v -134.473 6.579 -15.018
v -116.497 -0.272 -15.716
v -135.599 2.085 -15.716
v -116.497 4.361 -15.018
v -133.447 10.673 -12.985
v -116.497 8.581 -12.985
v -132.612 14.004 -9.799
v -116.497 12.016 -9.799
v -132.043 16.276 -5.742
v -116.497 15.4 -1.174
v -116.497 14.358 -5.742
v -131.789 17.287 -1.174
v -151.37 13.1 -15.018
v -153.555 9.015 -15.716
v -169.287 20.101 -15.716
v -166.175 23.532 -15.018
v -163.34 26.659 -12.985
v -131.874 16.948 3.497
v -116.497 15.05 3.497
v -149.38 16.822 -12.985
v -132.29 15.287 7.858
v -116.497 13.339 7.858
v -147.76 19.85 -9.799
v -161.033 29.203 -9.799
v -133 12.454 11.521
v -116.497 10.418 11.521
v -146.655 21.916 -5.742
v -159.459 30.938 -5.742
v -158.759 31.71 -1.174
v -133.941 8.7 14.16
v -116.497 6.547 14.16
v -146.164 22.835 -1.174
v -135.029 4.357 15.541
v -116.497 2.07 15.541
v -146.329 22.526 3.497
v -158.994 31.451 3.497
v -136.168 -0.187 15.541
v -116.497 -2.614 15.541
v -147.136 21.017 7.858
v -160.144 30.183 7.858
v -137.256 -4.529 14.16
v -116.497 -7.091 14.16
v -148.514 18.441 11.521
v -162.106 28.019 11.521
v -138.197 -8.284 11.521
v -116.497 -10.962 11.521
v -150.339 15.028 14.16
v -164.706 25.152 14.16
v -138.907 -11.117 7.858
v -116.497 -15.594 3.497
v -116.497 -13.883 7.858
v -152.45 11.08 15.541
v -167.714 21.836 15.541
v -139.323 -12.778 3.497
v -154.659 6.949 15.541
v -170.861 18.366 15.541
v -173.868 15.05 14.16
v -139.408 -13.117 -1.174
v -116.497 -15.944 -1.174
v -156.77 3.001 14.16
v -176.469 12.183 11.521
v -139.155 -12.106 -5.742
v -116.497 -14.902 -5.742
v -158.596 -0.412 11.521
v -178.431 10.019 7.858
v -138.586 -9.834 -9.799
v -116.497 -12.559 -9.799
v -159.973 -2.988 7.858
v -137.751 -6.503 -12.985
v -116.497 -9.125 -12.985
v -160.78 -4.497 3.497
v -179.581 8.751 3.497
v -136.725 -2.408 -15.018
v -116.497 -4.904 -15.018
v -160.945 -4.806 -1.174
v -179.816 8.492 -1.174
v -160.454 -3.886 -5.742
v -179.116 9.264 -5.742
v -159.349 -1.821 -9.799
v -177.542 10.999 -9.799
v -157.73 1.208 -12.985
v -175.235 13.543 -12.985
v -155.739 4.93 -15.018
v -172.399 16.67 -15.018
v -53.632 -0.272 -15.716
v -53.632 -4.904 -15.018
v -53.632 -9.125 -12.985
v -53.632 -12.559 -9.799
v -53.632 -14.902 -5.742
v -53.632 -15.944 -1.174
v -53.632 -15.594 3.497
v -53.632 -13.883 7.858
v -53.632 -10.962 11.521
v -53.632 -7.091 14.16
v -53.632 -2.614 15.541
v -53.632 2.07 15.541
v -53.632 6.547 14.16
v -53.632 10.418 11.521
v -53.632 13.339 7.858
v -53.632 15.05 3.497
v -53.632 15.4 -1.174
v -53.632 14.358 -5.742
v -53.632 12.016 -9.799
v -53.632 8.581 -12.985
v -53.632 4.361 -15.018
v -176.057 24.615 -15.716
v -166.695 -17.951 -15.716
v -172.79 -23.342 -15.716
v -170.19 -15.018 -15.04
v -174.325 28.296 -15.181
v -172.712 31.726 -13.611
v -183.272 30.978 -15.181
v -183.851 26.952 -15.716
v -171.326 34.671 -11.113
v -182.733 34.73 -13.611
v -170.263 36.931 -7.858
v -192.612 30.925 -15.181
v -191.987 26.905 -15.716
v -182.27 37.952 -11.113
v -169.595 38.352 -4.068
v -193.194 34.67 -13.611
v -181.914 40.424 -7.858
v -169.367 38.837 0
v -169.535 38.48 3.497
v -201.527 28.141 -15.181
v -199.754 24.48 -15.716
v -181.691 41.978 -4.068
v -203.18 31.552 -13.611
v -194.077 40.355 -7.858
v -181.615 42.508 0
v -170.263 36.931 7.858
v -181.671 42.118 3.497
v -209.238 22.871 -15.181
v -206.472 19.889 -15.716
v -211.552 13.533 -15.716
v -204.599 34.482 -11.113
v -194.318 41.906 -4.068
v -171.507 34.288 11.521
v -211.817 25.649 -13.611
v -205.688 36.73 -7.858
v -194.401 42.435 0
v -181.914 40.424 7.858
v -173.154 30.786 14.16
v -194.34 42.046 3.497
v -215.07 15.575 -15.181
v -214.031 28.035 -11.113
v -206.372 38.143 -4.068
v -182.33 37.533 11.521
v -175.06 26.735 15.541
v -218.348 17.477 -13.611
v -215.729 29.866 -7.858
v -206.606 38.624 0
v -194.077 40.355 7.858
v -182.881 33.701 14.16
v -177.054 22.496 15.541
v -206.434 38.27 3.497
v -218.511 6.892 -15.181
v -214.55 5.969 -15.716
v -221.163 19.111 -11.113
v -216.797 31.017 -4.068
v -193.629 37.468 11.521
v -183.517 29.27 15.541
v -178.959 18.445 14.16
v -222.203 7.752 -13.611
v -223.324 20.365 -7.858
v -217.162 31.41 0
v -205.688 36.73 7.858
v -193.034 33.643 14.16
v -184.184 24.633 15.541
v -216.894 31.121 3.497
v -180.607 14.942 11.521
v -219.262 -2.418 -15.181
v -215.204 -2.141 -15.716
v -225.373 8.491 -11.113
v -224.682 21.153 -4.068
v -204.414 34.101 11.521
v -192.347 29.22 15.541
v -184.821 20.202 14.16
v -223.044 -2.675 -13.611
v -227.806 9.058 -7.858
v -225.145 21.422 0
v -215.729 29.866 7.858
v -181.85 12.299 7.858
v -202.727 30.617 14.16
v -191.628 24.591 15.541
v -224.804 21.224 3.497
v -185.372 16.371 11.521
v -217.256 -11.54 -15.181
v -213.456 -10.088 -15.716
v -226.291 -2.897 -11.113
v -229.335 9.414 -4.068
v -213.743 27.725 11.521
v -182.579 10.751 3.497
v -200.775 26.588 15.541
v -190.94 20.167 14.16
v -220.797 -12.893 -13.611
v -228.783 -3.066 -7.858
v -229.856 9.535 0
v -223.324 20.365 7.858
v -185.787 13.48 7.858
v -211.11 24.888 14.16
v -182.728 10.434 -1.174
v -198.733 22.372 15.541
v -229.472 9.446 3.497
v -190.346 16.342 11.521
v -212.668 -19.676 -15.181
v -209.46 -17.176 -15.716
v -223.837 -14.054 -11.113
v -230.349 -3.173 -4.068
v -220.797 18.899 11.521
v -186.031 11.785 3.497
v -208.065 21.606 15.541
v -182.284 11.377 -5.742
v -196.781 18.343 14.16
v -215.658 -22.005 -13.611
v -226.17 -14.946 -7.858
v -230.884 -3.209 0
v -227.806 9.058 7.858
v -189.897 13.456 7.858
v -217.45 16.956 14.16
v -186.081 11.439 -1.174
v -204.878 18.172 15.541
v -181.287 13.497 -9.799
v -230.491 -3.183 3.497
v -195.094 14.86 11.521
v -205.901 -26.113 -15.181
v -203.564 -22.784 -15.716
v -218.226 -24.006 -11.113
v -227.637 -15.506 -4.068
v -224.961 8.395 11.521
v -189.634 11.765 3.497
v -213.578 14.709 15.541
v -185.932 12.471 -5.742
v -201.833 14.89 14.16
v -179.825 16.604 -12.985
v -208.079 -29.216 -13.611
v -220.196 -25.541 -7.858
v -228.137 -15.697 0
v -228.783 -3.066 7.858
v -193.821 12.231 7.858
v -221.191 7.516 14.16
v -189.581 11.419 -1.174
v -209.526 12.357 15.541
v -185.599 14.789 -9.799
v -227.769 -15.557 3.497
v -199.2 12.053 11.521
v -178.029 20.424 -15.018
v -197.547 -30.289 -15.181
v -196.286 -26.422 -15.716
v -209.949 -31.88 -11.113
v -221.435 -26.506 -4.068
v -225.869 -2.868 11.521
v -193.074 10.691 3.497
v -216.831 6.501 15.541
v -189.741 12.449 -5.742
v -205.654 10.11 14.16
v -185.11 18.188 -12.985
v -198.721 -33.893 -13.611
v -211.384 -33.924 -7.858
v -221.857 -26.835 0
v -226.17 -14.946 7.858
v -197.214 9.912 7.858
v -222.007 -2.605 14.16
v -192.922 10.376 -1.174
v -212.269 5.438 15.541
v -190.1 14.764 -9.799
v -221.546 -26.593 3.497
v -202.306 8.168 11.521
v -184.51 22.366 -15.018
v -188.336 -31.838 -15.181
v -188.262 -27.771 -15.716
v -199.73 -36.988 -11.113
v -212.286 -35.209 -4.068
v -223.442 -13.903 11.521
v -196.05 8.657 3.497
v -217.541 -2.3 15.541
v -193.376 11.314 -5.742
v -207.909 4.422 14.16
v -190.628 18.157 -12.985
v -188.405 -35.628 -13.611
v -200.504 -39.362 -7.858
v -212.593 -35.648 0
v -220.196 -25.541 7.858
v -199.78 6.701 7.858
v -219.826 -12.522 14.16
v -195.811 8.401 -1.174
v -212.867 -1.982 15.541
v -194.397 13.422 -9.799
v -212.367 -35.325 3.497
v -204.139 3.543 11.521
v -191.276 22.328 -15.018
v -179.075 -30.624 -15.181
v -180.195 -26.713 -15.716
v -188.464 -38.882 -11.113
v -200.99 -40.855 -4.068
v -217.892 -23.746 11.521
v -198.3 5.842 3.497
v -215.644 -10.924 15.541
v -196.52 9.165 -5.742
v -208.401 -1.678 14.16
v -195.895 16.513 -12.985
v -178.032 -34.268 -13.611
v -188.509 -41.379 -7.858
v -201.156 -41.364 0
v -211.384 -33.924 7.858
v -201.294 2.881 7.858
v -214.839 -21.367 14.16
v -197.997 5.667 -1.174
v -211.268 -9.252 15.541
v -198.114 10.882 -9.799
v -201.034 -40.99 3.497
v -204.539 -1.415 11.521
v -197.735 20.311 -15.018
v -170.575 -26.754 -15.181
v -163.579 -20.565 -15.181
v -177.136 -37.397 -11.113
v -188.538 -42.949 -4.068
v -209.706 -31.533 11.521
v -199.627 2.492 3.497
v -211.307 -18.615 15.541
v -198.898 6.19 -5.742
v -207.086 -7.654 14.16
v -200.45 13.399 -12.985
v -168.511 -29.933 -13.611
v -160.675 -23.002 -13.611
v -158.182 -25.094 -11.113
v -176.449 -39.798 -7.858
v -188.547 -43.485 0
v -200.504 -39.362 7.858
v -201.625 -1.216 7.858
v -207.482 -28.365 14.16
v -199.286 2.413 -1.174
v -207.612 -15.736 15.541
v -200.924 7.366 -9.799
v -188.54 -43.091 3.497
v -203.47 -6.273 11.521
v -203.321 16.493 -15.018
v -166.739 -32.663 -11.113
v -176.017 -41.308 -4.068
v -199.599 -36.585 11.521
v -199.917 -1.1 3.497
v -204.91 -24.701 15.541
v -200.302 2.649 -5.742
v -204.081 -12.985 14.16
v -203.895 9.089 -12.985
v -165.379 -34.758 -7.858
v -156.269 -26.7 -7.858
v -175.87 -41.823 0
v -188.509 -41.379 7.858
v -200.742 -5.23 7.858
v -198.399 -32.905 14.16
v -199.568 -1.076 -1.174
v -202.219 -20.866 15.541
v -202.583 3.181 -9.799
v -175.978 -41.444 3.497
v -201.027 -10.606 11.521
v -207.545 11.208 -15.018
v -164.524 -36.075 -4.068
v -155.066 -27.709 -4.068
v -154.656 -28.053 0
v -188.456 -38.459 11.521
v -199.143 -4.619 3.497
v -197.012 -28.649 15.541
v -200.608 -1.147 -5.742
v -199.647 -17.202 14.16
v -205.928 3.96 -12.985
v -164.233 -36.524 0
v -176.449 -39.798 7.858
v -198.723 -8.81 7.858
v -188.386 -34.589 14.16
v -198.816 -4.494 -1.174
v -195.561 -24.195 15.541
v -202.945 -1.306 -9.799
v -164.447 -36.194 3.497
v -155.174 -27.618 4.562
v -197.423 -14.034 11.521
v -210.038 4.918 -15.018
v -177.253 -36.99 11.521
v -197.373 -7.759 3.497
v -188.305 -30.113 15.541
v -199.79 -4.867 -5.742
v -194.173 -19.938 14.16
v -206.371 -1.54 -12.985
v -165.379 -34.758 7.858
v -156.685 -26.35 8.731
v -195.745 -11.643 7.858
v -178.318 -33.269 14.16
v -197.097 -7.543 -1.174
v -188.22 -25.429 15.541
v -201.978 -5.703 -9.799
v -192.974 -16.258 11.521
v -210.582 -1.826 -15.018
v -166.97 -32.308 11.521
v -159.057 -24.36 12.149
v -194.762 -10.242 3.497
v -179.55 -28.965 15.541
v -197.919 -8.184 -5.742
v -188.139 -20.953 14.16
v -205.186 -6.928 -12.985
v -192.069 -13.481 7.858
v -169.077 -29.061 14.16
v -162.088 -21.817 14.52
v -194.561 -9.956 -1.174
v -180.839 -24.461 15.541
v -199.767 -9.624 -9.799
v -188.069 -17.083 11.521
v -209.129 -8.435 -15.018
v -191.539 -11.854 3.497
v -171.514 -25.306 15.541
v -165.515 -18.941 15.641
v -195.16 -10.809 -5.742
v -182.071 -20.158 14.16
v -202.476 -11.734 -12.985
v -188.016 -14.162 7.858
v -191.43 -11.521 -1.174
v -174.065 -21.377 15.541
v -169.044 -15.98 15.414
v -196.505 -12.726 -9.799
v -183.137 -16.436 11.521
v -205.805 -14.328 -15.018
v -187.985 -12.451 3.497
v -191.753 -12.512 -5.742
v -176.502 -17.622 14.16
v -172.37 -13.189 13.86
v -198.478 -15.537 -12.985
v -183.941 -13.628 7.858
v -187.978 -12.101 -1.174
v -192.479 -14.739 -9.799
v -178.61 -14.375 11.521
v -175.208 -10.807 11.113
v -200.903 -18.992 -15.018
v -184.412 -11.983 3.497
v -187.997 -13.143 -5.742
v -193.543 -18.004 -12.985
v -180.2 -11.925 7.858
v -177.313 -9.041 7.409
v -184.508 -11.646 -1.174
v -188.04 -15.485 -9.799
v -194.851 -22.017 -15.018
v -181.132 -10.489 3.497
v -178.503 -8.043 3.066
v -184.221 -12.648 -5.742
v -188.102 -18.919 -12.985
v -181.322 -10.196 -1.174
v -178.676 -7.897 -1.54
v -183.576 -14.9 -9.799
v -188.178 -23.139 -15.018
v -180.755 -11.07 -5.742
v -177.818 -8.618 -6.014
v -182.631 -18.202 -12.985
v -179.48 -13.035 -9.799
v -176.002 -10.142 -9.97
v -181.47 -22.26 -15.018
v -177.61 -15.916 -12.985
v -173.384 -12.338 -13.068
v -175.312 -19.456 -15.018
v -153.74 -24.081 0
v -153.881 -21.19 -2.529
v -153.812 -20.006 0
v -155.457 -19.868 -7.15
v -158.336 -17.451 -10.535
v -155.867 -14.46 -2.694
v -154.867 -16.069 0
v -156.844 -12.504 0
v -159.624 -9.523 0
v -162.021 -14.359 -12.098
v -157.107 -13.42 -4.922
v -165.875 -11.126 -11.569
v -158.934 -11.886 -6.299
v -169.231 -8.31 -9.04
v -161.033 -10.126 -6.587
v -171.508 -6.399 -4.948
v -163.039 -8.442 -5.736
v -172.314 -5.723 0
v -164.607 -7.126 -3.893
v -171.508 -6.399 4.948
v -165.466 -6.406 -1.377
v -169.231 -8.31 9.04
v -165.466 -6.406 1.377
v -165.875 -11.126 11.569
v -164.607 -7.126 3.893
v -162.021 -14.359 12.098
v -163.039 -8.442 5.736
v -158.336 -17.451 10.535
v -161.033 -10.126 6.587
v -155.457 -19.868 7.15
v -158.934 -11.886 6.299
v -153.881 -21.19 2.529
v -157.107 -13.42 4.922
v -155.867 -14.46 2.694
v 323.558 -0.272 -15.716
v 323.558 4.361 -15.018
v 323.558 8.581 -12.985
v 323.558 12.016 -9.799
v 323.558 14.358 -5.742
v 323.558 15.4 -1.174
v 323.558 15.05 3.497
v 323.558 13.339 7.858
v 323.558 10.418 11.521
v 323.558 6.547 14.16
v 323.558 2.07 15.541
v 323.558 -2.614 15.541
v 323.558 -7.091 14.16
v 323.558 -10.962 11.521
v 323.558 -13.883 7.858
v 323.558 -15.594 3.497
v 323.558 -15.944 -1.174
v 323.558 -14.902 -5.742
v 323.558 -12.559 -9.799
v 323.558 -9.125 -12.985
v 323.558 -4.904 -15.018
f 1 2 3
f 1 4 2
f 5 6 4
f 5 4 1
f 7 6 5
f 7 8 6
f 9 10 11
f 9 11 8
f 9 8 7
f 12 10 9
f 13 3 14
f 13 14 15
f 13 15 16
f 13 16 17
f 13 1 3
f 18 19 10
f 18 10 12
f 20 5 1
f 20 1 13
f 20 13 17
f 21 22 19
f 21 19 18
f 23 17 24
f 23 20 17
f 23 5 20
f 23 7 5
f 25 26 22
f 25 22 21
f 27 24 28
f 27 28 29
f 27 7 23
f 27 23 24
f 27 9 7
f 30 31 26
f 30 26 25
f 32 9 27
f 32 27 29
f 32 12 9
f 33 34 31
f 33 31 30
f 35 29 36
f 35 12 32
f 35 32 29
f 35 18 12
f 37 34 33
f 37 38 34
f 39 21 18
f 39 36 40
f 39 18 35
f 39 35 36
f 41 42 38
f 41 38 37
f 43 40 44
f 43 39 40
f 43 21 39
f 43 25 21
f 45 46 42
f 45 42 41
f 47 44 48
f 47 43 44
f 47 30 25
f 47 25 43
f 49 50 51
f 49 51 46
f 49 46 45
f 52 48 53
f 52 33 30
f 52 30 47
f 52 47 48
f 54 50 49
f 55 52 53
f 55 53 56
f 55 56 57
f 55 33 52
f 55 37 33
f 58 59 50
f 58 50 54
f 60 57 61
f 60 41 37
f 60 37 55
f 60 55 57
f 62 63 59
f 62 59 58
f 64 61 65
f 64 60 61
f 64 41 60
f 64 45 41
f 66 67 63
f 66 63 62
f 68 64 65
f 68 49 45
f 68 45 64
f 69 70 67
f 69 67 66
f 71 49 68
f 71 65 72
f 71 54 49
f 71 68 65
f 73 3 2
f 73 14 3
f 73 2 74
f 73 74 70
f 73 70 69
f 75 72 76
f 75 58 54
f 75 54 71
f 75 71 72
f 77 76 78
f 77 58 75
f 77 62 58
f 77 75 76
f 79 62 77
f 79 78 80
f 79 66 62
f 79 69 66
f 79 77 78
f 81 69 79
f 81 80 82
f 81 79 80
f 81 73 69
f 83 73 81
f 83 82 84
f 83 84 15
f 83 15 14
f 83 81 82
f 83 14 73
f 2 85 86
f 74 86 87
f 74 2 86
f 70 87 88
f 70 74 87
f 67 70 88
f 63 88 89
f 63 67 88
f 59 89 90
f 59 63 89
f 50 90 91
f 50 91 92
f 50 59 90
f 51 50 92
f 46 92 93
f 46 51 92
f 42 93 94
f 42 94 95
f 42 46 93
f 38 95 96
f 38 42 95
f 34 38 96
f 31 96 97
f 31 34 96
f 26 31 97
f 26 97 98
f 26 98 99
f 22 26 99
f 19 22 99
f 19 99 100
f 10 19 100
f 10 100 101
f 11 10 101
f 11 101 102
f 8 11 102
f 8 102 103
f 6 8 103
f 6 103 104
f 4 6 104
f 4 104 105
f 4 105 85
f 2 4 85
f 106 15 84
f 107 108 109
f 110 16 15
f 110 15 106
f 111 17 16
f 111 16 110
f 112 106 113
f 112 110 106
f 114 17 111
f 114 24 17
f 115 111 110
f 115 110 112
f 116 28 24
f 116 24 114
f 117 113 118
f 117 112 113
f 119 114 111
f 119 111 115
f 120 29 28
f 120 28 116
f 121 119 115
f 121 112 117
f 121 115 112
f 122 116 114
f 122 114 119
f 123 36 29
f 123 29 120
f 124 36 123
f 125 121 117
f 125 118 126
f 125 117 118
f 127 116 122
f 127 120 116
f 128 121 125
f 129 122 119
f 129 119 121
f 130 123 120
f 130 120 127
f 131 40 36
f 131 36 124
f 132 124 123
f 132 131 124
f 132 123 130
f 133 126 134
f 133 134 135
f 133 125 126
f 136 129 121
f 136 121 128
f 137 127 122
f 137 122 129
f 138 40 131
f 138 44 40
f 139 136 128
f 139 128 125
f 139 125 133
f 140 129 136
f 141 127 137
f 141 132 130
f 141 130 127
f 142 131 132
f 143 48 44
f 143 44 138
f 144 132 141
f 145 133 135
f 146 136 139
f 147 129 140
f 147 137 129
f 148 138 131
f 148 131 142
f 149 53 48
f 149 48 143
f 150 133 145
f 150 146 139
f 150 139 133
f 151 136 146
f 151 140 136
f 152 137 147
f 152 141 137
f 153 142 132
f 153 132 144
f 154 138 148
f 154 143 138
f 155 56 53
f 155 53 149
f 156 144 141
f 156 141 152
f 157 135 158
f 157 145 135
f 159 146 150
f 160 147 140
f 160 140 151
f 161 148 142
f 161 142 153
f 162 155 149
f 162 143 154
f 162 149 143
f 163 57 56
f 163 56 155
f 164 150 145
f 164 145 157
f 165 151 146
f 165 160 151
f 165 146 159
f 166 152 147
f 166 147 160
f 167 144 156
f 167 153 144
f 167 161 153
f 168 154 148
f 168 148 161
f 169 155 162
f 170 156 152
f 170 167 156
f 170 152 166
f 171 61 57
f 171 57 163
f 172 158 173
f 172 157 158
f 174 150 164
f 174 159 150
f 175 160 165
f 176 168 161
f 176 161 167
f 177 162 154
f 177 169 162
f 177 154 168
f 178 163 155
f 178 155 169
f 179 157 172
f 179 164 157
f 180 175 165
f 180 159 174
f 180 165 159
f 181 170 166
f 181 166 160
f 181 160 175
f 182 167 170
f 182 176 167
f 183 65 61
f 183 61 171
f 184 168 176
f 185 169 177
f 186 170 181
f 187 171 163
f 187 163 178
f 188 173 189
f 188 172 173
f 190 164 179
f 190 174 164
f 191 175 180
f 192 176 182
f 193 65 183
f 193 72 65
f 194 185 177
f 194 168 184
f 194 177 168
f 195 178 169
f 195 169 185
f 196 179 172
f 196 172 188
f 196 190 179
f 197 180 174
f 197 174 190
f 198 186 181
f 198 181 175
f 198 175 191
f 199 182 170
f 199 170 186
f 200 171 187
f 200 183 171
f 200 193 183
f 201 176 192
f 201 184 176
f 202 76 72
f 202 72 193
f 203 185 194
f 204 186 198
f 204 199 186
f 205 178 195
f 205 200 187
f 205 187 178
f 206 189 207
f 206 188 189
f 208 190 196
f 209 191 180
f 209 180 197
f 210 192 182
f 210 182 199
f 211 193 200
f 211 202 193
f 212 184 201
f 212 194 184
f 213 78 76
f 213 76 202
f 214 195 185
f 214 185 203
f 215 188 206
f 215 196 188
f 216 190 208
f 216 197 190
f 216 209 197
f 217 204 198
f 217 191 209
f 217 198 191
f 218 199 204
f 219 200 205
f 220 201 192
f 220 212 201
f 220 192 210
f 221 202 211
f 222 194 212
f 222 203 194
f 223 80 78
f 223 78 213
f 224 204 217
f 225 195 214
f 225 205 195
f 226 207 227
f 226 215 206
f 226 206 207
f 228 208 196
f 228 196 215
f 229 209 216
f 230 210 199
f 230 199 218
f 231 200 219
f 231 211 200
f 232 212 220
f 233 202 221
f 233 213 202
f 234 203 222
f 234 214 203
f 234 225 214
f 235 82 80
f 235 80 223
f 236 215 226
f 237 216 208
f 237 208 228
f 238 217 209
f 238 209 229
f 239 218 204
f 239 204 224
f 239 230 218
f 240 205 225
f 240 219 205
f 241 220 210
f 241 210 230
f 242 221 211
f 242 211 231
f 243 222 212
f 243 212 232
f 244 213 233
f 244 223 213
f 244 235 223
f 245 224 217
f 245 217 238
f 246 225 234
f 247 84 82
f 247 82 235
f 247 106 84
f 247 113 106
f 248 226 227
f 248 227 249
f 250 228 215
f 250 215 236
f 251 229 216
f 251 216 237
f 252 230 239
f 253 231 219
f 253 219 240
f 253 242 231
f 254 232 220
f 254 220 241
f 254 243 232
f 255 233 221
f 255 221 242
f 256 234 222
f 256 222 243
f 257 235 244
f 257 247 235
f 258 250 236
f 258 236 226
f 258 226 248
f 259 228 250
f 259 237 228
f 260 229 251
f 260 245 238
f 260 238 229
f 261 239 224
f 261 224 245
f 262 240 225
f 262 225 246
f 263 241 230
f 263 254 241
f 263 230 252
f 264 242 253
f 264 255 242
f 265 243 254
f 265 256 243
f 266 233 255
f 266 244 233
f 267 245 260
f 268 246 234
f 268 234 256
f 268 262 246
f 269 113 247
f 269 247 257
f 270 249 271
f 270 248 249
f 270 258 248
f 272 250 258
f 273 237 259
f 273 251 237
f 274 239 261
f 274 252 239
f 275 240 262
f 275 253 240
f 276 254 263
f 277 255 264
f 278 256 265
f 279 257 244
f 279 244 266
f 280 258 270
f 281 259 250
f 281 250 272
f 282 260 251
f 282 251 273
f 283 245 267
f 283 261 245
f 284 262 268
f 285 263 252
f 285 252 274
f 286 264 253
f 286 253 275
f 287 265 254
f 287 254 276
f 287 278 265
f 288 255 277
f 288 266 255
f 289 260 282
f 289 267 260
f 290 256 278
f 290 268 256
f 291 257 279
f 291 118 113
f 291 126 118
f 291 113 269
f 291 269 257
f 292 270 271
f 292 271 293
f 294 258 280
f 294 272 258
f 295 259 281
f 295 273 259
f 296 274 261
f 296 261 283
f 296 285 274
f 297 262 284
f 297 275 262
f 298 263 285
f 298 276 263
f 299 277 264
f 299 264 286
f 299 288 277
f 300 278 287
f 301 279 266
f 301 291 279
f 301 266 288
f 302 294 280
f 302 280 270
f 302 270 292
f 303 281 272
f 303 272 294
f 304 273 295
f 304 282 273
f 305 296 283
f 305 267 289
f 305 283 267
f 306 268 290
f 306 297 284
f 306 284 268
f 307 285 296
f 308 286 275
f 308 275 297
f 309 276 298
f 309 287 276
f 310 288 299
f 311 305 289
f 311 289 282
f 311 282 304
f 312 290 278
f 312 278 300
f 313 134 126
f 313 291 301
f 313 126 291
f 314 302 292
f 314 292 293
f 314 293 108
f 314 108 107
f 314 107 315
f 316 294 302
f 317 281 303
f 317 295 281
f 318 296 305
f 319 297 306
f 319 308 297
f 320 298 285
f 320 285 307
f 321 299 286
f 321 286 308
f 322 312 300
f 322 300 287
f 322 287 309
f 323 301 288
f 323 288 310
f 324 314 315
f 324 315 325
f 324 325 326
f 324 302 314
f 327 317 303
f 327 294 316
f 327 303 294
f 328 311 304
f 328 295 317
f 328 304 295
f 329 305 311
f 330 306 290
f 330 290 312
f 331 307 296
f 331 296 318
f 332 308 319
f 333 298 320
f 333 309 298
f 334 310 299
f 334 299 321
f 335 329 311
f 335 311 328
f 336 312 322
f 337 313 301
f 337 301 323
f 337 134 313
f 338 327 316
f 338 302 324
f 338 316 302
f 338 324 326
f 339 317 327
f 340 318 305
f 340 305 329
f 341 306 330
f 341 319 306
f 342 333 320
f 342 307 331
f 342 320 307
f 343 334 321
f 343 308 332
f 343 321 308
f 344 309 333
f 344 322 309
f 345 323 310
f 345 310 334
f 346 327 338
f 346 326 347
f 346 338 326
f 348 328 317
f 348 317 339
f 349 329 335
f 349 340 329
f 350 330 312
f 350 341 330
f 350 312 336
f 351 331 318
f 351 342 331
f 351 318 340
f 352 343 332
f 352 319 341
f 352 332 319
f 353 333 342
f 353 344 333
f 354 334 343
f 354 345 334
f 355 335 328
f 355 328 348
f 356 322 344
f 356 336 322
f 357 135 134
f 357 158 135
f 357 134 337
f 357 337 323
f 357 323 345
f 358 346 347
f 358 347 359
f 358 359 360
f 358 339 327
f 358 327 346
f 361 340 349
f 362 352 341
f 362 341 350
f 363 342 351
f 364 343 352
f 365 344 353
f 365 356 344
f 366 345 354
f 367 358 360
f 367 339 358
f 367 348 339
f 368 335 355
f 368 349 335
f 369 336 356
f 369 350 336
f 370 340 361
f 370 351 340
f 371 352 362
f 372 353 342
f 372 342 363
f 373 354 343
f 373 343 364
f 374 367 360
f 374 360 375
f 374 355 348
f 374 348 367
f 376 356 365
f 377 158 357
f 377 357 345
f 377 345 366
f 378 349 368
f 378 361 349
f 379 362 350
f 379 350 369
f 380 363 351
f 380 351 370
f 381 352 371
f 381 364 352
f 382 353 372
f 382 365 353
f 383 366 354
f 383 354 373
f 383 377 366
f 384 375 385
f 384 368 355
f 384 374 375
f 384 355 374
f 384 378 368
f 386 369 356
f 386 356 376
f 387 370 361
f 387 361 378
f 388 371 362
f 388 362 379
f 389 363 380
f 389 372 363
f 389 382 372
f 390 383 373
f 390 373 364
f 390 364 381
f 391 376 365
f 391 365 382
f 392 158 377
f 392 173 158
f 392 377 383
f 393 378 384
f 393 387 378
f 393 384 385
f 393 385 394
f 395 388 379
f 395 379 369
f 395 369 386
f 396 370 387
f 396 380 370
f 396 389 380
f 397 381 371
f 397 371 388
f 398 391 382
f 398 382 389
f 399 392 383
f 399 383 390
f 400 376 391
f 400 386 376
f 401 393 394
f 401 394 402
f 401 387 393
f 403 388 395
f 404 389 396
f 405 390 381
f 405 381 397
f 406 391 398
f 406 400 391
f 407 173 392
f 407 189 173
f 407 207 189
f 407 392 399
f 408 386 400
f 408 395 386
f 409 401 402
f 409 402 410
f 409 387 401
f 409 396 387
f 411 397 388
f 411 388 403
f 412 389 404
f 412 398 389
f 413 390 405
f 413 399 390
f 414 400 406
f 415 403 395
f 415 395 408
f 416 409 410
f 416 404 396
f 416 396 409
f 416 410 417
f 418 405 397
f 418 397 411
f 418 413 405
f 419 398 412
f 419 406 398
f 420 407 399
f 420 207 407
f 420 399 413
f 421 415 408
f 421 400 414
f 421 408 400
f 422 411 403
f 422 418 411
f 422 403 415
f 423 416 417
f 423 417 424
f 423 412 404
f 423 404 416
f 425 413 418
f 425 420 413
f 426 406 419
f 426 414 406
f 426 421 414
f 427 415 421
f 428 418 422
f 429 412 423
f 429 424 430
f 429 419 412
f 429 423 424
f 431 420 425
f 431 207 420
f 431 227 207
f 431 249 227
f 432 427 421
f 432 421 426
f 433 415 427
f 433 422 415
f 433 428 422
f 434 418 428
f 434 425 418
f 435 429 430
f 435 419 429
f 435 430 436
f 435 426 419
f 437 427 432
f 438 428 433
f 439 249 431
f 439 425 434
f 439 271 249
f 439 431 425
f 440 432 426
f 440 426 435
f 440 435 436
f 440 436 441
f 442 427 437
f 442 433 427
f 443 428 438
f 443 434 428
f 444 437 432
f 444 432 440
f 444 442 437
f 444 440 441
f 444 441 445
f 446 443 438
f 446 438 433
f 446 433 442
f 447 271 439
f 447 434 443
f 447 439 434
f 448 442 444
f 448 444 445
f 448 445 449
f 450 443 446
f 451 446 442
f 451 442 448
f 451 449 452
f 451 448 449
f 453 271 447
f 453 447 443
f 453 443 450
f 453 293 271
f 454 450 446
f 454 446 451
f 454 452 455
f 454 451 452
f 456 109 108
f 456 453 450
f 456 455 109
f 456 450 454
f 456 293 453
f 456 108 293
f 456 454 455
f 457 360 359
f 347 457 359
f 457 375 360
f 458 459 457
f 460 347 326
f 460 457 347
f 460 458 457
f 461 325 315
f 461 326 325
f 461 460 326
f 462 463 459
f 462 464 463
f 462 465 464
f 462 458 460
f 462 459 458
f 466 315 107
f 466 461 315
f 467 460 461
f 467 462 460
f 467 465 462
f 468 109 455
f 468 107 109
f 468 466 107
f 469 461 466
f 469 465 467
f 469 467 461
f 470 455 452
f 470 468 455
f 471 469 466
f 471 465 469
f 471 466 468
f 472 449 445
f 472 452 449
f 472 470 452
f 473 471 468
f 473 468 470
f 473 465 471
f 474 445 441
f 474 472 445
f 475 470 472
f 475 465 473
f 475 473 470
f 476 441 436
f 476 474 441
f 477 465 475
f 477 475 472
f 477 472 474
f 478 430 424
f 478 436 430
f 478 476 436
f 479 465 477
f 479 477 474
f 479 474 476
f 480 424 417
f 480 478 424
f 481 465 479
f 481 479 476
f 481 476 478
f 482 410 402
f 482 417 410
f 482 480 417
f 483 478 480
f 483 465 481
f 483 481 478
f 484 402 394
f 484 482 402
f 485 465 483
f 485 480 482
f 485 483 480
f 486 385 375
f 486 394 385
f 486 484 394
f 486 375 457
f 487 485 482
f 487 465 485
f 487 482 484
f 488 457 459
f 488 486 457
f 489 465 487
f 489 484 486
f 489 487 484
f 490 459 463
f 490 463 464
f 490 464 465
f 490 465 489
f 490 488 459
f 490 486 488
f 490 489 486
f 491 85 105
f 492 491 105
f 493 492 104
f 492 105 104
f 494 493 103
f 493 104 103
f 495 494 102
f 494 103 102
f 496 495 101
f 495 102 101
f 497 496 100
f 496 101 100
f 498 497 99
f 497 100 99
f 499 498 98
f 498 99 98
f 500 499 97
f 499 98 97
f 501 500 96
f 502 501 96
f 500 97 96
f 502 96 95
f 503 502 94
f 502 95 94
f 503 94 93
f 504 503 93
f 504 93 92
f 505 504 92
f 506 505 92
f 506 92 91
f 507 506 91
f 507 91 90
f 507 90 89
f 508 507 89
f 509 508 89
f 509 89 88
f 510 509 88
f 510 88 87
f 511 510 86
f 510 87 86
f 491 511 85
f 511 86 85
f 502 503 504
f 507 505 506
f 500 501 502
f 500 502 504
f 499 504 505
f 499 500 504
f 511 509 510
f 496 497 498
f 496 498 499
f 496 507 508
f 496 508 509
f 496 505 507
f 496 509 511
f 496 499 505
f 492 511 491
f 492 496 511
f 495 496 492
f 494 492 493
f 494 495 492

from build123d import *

# Parameters (mm, degrees)
SWEEP3_PROFILE_R    = 1.27
DOME1_FACE_RADIUS   = 1.27
DOME1_HEIGHT        = 0.889
SKETCH61_R          = 1.27
BOSS_EXTRUDE2_DEPTH = 30.48
SCALE1_SCALE        = 12.375


with BuildPart() as part:
    # Sweep3: sweep along a path in Sketch40
    with BuildLine(Plane.XY) as sweep3_path:
        Line((10.838928394, 0), (5.758928394, 0))
        ThreePointArc((5.758928394, 0), (3.472667092, 0.425853711), (1.49305551, 1.646296296))
        ThreePointArc((1.49305551, 1.646296296), (-2.217360492, -0.151058595), (1.702533775, -1.428595463))
    # Sweep3 profile (on start of the path) → Sweep3 (sweep)
    with BuildSketch(Plane(origin=(10.838928394, 0, 0), x_dir=(0, 0, -1), z_dir=(-1, 0, 0))):
        Circle(SWEEP3_PROFILE_R)
    sweep(path=sweep3_path.line)

    # Dome1: a dome of height H over a round flat face of radius A is a cap of a sphere of radius (A * A + H * H) / (2 * H)
    dome1_r = (DOME1_FACE_RADIUS * DOME1_FACE_RADIUS + DOME1_HEIGHT * DOME1_HEIGHT) / (2 * DOME1_HEIGHT)
    dome1_base = Plane((1.702533775, -1.428595463, 0), z_dir=(0.642787609687, 0.766044443119, 0))
    with Locations(dome1_base.offset(DOME1_HEIGHT - dome1_r)):
        dome1_ball = Sphere(dome1_r, mode=Mode.PRIVATE)
    add(split(dome1_ball, bisect_by=dome1_base, keep=Keep.TOP, mode=Mode.PRIVATE))

    # Sketch61 → Boss-Extrude2 (add)
    with BuildSketch(Plane(origin=(10.838928394, 0, 0), x_dir=(0, 0, -1), z_dir=(1, 0, 0))):
        Circle(SKETCH61_R)
    extrude(amount=BOSS_EXTRUDE2_DEPTH)


with BuildPart() as part_1:
    # Scale1: scaled about (16.50671912, 0.023905417, 0)
    add(part.part.scale(SCALE1_SCALE).moved(Location((-187.76392999, -0.271924118, 0))))


solid = part_1.part
